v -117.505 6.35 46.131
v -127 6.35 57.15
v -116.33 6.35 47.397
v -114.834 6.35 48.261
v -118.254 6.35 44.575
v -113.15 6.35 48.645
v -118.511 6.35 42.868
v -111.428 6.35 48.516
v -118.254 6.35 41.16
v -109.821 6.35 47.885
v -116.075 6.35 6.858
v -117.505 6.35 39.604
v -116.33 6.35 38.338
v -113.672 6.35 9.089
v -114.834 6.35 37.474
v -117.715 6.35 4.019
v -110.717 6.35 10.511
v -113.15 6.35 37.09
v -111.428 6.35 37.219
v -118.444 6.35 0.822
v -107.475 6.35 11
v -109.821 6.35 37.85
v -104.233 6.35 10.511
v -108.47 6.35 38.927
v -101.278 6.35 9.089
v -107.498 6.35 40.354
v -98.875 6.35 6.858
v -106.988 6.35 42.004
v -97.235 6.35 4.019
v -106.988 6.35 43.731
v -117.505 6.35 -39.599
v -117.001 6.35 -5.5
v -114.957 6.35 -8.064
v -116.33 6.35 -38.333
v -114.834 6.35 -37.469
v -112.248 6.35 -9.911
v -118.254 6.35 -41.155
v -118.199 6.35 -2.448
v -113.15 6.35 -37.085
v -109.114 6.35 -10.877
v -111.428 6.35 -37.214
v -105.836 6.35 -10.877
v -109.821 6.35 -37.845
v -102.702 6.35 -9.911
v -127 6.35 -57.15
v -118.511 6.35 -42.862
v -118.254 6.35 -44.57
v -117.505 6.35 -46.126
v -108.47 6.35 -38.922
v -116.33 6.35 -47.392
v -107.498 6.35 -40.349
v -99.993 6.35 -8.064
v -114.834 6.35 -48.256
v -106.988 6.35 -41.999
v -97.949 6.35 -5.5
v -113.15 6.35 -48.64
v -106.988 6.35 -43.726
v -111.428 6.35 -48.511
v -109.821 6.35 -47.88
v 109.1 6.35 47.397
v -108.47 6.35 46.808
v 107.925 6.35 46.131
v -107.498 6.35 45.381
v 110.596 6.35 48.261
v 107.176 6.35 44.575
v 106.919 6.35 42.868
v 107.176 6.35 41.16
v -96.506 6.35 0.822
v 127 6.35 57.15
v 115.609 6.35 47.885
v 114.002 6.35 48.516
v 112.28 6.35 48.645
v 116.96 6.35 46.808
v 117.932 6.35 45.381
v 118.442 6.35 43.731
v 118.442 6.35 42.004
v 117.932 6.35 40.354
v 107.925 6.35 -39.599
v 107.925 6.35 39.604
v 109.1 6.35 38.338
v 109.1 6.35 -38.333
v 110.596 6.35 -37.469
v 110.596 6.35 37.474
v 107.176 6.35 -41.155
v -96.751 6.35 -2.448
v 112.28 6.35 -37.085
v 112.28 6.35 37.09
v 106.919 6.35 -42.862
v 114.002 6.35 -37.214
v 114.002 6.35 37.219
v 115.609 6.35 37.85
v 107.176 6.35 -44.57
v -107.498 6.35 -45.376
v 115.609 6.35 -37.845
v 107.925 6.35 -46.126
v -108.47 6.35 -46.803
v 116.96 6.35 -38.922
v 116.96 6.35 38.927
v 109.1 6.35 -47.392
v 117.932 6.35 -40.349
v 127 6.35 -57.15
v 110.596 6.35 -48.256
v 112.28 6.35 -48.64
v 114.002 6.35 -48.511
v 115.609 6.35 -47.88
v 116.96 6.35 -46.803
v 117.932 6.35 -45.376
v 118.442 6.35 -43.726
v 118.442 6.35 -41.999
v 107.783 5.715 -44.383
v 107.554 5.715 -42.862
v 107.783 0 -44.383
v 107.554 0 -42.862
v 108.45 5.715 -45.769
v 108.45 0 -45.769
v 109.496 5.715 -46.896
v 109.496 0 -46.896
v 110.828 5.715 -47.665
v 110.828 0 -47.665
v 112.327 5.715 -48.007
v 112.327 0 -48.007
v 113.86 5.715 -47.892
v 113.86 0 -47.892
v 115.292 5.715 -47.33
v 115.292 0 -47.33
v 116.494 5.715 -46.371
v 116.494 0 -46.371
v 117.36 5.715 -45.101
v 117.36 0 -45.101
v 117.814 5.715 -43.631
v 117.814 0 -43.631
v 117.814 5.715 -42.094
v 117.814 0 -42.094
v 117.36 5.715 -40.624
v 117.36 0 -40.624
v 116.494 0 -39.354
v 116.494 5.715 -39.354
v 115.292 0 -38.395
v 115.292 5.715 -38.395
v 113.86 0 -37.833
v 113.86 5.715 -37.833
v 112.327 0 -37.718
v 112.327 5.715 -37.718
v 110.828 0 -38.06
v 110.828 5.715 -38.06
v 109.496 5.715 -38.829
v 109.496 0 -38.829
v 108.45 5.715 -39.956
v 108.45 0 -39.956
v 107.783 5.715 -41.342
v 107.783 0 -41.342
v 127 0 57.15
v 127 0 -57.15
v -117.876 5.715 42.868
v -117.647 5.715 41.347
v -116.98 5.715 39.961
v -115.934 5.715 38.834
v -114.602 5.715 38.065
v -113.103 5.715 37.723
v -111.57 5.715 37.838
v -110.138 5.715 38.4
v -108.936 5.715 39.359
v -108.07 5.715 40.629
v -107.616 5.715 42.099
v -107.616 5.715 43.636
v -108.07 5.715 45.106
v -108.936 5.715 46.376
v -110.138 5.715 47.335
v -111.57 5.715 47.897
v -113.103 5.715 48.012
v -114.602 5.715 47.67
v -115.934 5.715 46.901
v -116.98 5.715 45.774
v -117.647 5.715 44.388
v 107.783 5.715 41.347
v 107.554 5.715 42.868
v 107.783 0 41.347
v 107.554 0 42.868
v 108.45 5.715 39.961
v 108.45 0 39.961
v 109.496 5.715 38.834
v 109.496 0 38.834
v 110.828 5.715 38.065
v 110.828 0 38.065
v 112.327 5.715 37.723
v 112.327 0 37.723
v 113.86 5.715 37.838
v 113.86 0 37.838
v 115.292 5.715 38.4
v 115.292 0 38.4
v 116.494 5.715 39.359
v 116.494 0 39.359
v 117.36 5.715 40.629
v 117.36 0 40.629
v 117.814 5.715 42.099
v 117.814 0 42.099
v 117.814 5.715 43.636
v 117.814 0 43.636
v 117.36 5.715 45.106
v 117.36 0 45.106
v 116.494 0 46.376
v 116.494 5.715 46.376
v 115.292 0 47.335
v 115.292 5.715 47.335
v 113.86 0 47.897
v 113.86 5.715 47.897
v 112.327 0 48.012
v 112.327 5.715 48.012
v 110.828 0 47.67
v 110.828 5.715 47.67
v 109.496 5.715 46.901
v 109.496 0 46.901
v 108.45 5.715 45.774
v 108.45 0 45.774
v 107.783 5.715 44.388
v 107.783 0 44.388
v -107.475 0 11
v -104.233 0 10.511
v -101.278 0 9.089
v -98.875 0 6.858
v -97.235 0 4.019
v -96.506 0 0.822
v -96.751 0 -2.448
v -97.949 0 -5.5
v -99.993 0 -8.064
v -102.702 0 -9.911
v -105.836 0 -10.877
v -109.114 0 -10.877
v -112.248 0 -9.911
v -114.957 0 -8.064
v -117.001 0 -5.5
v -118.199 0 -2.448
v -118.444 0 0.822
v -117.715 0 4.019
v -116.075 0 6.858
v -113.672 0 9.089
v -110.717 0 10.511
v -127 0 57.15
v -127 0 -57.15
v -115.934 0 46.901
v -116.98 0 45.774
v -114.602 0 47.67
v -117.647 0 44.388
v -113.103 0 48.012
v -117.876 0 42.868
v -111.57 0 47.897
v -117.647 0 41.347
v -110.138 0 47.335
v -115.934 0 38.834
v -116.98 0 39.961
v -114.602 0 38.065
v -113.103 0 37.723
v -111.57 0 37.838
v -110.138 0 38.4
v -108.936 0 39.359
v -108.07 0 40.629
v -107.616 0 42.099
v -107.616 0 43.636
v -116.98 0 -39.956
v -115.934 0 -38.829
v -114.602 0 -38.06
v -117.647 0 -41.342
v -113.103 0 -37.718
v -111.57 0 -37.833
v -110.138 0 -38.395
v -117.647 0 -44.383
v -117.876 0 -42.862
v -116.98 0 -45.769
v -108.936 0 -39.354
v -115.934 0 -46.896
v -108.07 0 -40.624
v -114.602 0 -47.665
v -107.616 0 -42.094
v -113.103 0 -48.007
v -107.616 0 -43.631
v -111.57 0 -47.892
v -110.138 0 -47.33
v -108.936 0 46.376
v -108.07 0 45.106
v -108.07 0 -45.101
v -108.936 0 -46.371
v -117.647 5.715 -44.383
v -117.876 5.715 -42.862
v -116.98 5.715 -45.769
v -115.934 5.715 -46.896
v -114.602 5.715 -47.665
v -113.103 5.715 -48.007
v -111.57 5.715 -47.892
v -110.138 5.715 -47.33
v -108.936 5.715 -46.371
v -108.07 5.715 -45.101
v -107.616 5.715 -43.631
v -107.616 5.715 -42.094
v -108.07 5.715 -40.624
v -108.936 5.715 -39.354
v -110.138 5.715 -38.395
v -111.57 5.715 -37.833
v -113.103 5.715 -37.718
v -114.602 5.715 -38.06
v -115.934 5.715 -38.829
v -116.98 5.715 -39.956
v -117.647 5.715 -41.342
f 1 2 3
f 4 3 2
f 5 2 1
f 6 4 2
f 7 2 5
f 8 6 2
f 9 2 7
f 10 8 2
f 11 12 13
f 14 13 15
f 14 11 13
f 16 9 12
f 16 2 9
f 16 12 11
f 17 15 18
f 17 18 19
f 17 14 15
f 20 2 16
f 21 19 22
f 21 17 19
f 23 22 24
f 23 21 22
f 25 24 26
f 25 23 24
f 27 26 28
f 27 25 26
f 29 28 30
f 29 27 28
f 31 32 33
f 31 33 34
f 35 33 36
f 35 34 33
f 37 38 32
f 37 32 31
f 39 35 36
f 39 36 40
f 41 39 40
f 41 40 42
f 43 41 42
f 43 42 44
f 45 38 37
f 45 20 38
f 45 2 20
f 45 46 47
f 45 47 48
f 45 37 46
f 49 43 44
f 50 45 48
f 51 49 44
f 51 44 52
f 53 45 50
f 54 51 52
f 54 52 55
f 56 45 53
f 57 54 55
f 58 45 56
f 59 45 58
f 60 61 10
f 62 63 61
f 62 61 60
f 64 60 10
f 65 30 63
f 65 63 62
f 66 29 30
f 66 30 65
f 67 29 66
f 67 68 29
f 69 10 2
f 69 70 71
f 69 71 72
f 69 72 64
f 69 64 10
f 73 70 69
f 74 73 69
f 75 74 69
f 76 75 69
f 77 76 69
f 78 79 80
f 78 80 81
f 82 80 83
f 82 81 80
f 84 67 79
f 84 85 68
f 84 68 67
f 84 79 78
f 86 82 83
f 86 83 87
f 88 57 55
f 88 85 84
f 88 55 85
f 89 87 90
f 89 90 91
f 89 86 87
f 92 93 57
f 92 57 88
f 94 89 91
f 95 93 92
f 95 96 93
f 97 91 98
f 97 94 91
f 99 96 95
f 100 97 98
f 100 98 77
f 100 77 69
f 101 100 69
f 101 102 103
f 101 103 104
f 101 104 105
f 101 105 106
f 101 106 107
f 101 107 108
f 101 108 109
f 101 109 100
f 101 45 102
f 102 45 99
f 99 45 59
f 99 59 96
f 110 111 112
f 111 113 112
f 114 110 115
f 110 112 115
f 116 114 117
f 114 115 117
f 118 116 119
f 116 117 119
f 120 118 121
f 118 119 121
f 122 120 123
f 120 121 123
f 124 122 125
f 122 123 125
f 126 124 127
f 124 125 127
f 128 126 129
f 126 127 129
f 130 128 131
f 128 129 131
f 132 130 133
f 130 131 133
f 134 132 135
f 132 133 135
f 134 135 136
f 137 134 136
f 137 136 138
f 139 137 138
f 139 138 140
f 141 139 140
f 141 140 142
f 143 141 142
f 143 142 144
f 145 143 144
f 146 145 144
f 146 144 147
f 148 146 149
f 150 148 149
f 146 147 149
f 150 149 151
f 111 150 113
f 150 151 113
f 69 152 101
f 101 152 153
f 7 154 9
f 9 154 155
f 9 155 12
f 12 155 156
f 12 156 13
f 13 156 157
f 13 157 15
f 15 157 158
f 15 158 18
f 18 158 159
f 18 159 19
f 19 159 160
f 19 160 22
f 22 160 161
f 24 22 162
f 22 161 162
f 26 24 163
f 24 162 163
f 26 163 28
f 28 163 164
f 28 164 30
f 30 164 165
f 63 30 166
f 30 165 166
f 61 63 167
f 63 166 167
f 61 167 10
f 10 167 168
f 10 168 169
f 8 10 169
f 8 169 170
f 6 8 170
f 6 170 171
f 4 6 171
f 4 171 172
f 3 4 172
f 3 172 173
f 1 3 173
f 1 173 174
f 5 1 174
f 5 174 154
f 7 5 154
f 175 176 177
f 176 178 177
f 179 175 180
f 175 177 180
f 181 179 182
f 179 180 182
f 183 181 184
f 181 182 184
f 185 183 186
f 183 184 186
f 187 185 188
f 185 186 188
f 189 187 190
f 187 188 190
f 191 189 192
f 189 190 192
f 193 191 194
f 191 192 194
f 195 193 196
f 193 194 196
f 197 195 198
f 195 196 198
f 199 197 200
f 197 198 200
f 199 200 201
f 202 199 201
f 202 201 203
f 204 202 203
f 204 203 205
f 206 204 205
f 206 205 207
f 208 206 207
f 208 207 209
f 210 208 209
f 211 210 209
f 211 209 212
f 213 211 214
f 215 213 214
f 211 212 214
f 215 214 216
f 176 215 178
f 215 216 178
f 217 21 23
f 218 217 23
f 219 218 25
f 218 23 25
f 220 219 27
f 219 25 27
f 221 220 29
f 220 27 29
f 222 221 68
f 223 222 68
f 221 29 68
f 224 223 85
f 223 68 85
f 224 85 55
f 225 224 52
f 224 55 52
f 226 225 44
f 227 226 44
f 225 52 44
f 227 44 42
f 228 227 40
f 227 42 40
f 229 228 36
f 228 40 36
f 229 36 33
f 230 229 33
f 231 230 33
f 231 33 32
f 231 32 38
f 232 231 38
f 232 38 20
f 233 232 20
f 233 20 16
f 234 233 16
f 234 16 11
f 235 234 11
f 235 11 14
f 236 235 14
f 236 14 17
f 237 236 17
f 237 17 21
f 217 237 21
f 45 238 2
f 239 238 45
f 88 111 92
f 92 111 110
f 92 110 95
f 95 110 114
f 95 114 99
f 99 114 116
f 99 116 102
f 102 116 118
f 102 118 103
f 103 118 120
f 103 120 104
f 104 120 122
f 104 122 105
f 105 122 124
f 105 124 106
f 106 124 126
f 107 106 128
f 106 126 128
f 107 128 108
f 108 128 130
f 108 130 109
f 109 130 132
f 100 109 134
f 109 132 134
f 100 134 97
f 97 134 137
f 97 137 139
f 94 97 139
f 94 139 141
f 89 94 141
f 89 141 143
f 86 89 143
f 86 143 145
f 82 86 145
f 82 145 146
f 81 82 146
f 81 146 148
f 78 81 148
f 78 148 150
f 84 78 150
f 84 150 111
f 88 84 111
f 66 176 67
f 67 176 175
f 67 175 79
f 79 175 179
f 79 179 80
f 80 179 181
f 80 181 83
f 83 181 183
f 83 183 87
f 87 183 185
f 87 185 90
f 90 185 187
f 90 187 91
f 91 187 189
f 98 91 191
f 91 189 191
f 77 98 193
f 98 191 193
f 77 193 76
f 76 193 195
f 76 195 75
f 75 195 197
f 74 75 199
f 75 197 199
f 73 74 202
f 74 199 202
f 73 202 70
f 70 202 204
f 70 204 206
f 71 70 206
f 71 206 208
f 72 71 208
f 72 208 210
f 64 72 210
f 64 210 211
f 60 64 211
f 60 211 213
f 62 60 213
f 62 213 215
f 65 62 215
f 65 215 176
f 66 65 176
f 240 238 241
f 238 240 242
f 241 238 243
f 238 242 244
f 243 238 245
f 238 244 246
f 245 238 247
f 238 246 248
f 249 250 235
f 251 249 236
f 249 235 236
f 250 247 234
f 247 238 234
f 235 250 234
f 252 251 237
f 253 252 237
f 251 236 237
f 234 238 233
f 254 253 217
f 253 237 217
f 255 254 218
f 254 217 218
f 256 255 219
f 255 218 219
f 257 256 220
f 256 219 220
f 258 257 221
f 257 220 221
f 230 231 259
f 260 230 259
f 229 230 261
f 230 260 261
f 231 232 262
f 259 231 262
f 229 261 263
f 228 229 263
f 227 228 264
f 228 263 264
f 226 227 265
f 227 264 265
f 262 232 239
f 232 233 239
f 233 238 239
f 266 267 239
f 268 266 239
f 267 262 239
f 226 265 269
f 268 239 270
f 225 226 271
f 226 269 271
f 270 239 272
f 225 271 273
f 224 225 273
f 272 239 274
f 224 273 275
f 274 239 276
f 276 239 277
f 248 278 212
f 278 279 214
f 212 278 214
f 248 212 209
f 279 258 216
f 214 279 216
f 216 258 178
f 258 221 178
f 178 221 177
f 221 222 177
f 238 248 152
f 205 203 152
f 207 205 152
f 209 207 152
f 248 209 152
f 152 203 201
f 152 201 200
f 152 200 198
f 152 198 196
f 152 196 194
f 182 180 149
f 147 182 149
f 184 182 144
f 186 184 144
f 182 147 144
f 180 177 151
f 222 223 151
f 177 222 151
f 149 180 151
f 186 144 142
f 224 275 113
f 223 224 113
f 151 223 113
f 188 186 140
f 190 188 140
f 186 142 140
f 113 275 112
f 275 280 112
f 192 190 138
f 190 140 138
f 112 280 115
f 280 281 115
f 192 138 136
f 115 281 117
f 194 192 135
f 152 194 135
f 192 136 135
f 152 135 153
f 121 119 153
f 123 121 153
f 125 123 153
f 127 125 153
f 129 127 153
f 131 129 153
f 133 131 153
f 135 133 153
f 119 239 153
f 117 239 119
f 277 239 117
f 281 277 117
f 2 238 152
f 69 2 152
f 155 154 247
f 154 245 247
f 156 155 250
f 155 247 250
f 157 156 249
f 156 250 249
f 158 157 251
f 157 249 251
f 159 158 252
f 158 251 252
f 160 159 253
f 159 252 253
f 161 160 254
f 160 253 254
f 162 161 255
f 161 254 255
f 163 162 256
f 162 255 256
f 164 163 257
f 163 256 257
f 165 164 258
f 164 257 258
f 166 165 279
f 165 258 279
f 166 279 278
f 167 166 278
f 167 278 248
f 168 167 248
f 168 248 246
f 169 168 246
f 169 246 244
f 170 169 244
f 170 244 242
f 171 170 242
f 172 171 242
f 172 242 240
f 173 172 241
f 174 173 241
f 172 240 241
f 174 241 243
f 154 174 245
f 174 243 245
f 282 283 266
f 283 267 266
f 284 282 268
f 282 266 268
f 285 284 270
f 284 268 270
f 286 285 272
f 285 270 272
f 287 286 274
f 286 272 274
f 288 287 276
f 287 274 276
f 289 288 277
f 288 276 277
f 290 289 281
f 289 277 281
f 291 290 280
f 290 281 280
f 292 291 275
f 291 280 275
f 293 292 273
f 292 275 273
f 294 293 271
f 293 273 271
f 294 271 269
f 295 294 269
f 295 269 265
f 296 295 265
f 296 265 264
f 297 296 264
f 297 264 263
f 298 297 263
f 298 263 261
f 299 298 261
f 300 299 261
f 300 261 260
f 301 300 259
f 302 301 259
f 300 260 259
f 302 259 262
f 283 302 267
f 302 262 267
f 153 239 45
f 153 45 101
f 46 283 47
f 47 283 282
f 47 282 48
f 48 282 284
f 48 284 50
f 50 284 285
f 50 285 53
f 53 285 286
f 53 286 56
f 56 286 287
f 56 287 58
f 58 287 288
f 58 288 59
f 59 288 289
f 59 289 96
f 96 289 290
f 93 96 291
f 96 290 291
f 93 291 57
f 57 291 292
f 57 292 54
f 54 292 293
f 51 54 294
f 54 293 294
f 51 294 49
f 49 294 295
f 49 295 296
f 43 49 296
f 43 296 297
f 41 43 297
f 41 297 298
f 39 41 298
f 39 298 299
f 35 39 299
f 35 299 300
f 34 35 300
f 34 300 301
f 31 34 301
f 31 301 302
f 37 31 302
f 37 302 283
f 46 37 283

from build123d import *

# Parameters (mm, degrees)
SKETCH1_W                         = 254
SKETCH1_H                         = 114.3
BOSS_EXTRUDE1_DEPTH               = 6.35
SKETCH2_R                         = 11
CUT_EXTRUDE1_DEPTH                = 140.411064841
F_3_8_CLEARANCE_HOLE1_D           = 10.31748
F_3_8_CLEARANCE_HOLE1_CSINK_D     = 11.58748
F_3_8_CLEARANCE_HOLE1_CSINK_ANGLE = 90


with BuildPart() as part:
    # Sketch1 → Boss-Extrude1 (new body)
    with BuildSketch(Plane(origin=(0, 0, 0), x_dir=(1, 0, 0), z_dir=(0, 1, 0))):
        Rectangle(SKETCH1_W, SKETCH1_H)
    extrude(amount=BOSS_EXTRUDE1_DEPTH)

    # Sketch2 → Cut-Extrude1 (cut, through all)
    with BuildSketch(Plane(origin=(0, 6.35, 0), x_dir=(1, 0, 0), z_dir=(0, 1, 0))):
        with Locations(Location((-107.475, 0, 0), (0, 0, 270))):
            Circle(SKETCH2_R)
    extrude(amount=-CUT_EXTRUDE1_DEPTH, mode=Mode.SUBTRACT)

    # 3/8 Clearance Hole1 (through all)
    with Locations(Plane(origin=(0, 6.35, 0), x_dir=(1, 0, 0), z_dir=(0, 1, 0))):
        with Locations((112.7125, 42.8625), (112.7125, -42.8675), (-112.7175, -42.8675), (-112.7175, 42.8625)):
            CounterSinkHole(F_3_8_CLEARANCE_HOLE1_D / 2, F_3_8_CLEARANCE_HOLE1_CSINK_D / 2, counter_sink_angle=F_3_8_CLEARANCE_HOLE1_CSINK_ANGLE)


solid = part.part
